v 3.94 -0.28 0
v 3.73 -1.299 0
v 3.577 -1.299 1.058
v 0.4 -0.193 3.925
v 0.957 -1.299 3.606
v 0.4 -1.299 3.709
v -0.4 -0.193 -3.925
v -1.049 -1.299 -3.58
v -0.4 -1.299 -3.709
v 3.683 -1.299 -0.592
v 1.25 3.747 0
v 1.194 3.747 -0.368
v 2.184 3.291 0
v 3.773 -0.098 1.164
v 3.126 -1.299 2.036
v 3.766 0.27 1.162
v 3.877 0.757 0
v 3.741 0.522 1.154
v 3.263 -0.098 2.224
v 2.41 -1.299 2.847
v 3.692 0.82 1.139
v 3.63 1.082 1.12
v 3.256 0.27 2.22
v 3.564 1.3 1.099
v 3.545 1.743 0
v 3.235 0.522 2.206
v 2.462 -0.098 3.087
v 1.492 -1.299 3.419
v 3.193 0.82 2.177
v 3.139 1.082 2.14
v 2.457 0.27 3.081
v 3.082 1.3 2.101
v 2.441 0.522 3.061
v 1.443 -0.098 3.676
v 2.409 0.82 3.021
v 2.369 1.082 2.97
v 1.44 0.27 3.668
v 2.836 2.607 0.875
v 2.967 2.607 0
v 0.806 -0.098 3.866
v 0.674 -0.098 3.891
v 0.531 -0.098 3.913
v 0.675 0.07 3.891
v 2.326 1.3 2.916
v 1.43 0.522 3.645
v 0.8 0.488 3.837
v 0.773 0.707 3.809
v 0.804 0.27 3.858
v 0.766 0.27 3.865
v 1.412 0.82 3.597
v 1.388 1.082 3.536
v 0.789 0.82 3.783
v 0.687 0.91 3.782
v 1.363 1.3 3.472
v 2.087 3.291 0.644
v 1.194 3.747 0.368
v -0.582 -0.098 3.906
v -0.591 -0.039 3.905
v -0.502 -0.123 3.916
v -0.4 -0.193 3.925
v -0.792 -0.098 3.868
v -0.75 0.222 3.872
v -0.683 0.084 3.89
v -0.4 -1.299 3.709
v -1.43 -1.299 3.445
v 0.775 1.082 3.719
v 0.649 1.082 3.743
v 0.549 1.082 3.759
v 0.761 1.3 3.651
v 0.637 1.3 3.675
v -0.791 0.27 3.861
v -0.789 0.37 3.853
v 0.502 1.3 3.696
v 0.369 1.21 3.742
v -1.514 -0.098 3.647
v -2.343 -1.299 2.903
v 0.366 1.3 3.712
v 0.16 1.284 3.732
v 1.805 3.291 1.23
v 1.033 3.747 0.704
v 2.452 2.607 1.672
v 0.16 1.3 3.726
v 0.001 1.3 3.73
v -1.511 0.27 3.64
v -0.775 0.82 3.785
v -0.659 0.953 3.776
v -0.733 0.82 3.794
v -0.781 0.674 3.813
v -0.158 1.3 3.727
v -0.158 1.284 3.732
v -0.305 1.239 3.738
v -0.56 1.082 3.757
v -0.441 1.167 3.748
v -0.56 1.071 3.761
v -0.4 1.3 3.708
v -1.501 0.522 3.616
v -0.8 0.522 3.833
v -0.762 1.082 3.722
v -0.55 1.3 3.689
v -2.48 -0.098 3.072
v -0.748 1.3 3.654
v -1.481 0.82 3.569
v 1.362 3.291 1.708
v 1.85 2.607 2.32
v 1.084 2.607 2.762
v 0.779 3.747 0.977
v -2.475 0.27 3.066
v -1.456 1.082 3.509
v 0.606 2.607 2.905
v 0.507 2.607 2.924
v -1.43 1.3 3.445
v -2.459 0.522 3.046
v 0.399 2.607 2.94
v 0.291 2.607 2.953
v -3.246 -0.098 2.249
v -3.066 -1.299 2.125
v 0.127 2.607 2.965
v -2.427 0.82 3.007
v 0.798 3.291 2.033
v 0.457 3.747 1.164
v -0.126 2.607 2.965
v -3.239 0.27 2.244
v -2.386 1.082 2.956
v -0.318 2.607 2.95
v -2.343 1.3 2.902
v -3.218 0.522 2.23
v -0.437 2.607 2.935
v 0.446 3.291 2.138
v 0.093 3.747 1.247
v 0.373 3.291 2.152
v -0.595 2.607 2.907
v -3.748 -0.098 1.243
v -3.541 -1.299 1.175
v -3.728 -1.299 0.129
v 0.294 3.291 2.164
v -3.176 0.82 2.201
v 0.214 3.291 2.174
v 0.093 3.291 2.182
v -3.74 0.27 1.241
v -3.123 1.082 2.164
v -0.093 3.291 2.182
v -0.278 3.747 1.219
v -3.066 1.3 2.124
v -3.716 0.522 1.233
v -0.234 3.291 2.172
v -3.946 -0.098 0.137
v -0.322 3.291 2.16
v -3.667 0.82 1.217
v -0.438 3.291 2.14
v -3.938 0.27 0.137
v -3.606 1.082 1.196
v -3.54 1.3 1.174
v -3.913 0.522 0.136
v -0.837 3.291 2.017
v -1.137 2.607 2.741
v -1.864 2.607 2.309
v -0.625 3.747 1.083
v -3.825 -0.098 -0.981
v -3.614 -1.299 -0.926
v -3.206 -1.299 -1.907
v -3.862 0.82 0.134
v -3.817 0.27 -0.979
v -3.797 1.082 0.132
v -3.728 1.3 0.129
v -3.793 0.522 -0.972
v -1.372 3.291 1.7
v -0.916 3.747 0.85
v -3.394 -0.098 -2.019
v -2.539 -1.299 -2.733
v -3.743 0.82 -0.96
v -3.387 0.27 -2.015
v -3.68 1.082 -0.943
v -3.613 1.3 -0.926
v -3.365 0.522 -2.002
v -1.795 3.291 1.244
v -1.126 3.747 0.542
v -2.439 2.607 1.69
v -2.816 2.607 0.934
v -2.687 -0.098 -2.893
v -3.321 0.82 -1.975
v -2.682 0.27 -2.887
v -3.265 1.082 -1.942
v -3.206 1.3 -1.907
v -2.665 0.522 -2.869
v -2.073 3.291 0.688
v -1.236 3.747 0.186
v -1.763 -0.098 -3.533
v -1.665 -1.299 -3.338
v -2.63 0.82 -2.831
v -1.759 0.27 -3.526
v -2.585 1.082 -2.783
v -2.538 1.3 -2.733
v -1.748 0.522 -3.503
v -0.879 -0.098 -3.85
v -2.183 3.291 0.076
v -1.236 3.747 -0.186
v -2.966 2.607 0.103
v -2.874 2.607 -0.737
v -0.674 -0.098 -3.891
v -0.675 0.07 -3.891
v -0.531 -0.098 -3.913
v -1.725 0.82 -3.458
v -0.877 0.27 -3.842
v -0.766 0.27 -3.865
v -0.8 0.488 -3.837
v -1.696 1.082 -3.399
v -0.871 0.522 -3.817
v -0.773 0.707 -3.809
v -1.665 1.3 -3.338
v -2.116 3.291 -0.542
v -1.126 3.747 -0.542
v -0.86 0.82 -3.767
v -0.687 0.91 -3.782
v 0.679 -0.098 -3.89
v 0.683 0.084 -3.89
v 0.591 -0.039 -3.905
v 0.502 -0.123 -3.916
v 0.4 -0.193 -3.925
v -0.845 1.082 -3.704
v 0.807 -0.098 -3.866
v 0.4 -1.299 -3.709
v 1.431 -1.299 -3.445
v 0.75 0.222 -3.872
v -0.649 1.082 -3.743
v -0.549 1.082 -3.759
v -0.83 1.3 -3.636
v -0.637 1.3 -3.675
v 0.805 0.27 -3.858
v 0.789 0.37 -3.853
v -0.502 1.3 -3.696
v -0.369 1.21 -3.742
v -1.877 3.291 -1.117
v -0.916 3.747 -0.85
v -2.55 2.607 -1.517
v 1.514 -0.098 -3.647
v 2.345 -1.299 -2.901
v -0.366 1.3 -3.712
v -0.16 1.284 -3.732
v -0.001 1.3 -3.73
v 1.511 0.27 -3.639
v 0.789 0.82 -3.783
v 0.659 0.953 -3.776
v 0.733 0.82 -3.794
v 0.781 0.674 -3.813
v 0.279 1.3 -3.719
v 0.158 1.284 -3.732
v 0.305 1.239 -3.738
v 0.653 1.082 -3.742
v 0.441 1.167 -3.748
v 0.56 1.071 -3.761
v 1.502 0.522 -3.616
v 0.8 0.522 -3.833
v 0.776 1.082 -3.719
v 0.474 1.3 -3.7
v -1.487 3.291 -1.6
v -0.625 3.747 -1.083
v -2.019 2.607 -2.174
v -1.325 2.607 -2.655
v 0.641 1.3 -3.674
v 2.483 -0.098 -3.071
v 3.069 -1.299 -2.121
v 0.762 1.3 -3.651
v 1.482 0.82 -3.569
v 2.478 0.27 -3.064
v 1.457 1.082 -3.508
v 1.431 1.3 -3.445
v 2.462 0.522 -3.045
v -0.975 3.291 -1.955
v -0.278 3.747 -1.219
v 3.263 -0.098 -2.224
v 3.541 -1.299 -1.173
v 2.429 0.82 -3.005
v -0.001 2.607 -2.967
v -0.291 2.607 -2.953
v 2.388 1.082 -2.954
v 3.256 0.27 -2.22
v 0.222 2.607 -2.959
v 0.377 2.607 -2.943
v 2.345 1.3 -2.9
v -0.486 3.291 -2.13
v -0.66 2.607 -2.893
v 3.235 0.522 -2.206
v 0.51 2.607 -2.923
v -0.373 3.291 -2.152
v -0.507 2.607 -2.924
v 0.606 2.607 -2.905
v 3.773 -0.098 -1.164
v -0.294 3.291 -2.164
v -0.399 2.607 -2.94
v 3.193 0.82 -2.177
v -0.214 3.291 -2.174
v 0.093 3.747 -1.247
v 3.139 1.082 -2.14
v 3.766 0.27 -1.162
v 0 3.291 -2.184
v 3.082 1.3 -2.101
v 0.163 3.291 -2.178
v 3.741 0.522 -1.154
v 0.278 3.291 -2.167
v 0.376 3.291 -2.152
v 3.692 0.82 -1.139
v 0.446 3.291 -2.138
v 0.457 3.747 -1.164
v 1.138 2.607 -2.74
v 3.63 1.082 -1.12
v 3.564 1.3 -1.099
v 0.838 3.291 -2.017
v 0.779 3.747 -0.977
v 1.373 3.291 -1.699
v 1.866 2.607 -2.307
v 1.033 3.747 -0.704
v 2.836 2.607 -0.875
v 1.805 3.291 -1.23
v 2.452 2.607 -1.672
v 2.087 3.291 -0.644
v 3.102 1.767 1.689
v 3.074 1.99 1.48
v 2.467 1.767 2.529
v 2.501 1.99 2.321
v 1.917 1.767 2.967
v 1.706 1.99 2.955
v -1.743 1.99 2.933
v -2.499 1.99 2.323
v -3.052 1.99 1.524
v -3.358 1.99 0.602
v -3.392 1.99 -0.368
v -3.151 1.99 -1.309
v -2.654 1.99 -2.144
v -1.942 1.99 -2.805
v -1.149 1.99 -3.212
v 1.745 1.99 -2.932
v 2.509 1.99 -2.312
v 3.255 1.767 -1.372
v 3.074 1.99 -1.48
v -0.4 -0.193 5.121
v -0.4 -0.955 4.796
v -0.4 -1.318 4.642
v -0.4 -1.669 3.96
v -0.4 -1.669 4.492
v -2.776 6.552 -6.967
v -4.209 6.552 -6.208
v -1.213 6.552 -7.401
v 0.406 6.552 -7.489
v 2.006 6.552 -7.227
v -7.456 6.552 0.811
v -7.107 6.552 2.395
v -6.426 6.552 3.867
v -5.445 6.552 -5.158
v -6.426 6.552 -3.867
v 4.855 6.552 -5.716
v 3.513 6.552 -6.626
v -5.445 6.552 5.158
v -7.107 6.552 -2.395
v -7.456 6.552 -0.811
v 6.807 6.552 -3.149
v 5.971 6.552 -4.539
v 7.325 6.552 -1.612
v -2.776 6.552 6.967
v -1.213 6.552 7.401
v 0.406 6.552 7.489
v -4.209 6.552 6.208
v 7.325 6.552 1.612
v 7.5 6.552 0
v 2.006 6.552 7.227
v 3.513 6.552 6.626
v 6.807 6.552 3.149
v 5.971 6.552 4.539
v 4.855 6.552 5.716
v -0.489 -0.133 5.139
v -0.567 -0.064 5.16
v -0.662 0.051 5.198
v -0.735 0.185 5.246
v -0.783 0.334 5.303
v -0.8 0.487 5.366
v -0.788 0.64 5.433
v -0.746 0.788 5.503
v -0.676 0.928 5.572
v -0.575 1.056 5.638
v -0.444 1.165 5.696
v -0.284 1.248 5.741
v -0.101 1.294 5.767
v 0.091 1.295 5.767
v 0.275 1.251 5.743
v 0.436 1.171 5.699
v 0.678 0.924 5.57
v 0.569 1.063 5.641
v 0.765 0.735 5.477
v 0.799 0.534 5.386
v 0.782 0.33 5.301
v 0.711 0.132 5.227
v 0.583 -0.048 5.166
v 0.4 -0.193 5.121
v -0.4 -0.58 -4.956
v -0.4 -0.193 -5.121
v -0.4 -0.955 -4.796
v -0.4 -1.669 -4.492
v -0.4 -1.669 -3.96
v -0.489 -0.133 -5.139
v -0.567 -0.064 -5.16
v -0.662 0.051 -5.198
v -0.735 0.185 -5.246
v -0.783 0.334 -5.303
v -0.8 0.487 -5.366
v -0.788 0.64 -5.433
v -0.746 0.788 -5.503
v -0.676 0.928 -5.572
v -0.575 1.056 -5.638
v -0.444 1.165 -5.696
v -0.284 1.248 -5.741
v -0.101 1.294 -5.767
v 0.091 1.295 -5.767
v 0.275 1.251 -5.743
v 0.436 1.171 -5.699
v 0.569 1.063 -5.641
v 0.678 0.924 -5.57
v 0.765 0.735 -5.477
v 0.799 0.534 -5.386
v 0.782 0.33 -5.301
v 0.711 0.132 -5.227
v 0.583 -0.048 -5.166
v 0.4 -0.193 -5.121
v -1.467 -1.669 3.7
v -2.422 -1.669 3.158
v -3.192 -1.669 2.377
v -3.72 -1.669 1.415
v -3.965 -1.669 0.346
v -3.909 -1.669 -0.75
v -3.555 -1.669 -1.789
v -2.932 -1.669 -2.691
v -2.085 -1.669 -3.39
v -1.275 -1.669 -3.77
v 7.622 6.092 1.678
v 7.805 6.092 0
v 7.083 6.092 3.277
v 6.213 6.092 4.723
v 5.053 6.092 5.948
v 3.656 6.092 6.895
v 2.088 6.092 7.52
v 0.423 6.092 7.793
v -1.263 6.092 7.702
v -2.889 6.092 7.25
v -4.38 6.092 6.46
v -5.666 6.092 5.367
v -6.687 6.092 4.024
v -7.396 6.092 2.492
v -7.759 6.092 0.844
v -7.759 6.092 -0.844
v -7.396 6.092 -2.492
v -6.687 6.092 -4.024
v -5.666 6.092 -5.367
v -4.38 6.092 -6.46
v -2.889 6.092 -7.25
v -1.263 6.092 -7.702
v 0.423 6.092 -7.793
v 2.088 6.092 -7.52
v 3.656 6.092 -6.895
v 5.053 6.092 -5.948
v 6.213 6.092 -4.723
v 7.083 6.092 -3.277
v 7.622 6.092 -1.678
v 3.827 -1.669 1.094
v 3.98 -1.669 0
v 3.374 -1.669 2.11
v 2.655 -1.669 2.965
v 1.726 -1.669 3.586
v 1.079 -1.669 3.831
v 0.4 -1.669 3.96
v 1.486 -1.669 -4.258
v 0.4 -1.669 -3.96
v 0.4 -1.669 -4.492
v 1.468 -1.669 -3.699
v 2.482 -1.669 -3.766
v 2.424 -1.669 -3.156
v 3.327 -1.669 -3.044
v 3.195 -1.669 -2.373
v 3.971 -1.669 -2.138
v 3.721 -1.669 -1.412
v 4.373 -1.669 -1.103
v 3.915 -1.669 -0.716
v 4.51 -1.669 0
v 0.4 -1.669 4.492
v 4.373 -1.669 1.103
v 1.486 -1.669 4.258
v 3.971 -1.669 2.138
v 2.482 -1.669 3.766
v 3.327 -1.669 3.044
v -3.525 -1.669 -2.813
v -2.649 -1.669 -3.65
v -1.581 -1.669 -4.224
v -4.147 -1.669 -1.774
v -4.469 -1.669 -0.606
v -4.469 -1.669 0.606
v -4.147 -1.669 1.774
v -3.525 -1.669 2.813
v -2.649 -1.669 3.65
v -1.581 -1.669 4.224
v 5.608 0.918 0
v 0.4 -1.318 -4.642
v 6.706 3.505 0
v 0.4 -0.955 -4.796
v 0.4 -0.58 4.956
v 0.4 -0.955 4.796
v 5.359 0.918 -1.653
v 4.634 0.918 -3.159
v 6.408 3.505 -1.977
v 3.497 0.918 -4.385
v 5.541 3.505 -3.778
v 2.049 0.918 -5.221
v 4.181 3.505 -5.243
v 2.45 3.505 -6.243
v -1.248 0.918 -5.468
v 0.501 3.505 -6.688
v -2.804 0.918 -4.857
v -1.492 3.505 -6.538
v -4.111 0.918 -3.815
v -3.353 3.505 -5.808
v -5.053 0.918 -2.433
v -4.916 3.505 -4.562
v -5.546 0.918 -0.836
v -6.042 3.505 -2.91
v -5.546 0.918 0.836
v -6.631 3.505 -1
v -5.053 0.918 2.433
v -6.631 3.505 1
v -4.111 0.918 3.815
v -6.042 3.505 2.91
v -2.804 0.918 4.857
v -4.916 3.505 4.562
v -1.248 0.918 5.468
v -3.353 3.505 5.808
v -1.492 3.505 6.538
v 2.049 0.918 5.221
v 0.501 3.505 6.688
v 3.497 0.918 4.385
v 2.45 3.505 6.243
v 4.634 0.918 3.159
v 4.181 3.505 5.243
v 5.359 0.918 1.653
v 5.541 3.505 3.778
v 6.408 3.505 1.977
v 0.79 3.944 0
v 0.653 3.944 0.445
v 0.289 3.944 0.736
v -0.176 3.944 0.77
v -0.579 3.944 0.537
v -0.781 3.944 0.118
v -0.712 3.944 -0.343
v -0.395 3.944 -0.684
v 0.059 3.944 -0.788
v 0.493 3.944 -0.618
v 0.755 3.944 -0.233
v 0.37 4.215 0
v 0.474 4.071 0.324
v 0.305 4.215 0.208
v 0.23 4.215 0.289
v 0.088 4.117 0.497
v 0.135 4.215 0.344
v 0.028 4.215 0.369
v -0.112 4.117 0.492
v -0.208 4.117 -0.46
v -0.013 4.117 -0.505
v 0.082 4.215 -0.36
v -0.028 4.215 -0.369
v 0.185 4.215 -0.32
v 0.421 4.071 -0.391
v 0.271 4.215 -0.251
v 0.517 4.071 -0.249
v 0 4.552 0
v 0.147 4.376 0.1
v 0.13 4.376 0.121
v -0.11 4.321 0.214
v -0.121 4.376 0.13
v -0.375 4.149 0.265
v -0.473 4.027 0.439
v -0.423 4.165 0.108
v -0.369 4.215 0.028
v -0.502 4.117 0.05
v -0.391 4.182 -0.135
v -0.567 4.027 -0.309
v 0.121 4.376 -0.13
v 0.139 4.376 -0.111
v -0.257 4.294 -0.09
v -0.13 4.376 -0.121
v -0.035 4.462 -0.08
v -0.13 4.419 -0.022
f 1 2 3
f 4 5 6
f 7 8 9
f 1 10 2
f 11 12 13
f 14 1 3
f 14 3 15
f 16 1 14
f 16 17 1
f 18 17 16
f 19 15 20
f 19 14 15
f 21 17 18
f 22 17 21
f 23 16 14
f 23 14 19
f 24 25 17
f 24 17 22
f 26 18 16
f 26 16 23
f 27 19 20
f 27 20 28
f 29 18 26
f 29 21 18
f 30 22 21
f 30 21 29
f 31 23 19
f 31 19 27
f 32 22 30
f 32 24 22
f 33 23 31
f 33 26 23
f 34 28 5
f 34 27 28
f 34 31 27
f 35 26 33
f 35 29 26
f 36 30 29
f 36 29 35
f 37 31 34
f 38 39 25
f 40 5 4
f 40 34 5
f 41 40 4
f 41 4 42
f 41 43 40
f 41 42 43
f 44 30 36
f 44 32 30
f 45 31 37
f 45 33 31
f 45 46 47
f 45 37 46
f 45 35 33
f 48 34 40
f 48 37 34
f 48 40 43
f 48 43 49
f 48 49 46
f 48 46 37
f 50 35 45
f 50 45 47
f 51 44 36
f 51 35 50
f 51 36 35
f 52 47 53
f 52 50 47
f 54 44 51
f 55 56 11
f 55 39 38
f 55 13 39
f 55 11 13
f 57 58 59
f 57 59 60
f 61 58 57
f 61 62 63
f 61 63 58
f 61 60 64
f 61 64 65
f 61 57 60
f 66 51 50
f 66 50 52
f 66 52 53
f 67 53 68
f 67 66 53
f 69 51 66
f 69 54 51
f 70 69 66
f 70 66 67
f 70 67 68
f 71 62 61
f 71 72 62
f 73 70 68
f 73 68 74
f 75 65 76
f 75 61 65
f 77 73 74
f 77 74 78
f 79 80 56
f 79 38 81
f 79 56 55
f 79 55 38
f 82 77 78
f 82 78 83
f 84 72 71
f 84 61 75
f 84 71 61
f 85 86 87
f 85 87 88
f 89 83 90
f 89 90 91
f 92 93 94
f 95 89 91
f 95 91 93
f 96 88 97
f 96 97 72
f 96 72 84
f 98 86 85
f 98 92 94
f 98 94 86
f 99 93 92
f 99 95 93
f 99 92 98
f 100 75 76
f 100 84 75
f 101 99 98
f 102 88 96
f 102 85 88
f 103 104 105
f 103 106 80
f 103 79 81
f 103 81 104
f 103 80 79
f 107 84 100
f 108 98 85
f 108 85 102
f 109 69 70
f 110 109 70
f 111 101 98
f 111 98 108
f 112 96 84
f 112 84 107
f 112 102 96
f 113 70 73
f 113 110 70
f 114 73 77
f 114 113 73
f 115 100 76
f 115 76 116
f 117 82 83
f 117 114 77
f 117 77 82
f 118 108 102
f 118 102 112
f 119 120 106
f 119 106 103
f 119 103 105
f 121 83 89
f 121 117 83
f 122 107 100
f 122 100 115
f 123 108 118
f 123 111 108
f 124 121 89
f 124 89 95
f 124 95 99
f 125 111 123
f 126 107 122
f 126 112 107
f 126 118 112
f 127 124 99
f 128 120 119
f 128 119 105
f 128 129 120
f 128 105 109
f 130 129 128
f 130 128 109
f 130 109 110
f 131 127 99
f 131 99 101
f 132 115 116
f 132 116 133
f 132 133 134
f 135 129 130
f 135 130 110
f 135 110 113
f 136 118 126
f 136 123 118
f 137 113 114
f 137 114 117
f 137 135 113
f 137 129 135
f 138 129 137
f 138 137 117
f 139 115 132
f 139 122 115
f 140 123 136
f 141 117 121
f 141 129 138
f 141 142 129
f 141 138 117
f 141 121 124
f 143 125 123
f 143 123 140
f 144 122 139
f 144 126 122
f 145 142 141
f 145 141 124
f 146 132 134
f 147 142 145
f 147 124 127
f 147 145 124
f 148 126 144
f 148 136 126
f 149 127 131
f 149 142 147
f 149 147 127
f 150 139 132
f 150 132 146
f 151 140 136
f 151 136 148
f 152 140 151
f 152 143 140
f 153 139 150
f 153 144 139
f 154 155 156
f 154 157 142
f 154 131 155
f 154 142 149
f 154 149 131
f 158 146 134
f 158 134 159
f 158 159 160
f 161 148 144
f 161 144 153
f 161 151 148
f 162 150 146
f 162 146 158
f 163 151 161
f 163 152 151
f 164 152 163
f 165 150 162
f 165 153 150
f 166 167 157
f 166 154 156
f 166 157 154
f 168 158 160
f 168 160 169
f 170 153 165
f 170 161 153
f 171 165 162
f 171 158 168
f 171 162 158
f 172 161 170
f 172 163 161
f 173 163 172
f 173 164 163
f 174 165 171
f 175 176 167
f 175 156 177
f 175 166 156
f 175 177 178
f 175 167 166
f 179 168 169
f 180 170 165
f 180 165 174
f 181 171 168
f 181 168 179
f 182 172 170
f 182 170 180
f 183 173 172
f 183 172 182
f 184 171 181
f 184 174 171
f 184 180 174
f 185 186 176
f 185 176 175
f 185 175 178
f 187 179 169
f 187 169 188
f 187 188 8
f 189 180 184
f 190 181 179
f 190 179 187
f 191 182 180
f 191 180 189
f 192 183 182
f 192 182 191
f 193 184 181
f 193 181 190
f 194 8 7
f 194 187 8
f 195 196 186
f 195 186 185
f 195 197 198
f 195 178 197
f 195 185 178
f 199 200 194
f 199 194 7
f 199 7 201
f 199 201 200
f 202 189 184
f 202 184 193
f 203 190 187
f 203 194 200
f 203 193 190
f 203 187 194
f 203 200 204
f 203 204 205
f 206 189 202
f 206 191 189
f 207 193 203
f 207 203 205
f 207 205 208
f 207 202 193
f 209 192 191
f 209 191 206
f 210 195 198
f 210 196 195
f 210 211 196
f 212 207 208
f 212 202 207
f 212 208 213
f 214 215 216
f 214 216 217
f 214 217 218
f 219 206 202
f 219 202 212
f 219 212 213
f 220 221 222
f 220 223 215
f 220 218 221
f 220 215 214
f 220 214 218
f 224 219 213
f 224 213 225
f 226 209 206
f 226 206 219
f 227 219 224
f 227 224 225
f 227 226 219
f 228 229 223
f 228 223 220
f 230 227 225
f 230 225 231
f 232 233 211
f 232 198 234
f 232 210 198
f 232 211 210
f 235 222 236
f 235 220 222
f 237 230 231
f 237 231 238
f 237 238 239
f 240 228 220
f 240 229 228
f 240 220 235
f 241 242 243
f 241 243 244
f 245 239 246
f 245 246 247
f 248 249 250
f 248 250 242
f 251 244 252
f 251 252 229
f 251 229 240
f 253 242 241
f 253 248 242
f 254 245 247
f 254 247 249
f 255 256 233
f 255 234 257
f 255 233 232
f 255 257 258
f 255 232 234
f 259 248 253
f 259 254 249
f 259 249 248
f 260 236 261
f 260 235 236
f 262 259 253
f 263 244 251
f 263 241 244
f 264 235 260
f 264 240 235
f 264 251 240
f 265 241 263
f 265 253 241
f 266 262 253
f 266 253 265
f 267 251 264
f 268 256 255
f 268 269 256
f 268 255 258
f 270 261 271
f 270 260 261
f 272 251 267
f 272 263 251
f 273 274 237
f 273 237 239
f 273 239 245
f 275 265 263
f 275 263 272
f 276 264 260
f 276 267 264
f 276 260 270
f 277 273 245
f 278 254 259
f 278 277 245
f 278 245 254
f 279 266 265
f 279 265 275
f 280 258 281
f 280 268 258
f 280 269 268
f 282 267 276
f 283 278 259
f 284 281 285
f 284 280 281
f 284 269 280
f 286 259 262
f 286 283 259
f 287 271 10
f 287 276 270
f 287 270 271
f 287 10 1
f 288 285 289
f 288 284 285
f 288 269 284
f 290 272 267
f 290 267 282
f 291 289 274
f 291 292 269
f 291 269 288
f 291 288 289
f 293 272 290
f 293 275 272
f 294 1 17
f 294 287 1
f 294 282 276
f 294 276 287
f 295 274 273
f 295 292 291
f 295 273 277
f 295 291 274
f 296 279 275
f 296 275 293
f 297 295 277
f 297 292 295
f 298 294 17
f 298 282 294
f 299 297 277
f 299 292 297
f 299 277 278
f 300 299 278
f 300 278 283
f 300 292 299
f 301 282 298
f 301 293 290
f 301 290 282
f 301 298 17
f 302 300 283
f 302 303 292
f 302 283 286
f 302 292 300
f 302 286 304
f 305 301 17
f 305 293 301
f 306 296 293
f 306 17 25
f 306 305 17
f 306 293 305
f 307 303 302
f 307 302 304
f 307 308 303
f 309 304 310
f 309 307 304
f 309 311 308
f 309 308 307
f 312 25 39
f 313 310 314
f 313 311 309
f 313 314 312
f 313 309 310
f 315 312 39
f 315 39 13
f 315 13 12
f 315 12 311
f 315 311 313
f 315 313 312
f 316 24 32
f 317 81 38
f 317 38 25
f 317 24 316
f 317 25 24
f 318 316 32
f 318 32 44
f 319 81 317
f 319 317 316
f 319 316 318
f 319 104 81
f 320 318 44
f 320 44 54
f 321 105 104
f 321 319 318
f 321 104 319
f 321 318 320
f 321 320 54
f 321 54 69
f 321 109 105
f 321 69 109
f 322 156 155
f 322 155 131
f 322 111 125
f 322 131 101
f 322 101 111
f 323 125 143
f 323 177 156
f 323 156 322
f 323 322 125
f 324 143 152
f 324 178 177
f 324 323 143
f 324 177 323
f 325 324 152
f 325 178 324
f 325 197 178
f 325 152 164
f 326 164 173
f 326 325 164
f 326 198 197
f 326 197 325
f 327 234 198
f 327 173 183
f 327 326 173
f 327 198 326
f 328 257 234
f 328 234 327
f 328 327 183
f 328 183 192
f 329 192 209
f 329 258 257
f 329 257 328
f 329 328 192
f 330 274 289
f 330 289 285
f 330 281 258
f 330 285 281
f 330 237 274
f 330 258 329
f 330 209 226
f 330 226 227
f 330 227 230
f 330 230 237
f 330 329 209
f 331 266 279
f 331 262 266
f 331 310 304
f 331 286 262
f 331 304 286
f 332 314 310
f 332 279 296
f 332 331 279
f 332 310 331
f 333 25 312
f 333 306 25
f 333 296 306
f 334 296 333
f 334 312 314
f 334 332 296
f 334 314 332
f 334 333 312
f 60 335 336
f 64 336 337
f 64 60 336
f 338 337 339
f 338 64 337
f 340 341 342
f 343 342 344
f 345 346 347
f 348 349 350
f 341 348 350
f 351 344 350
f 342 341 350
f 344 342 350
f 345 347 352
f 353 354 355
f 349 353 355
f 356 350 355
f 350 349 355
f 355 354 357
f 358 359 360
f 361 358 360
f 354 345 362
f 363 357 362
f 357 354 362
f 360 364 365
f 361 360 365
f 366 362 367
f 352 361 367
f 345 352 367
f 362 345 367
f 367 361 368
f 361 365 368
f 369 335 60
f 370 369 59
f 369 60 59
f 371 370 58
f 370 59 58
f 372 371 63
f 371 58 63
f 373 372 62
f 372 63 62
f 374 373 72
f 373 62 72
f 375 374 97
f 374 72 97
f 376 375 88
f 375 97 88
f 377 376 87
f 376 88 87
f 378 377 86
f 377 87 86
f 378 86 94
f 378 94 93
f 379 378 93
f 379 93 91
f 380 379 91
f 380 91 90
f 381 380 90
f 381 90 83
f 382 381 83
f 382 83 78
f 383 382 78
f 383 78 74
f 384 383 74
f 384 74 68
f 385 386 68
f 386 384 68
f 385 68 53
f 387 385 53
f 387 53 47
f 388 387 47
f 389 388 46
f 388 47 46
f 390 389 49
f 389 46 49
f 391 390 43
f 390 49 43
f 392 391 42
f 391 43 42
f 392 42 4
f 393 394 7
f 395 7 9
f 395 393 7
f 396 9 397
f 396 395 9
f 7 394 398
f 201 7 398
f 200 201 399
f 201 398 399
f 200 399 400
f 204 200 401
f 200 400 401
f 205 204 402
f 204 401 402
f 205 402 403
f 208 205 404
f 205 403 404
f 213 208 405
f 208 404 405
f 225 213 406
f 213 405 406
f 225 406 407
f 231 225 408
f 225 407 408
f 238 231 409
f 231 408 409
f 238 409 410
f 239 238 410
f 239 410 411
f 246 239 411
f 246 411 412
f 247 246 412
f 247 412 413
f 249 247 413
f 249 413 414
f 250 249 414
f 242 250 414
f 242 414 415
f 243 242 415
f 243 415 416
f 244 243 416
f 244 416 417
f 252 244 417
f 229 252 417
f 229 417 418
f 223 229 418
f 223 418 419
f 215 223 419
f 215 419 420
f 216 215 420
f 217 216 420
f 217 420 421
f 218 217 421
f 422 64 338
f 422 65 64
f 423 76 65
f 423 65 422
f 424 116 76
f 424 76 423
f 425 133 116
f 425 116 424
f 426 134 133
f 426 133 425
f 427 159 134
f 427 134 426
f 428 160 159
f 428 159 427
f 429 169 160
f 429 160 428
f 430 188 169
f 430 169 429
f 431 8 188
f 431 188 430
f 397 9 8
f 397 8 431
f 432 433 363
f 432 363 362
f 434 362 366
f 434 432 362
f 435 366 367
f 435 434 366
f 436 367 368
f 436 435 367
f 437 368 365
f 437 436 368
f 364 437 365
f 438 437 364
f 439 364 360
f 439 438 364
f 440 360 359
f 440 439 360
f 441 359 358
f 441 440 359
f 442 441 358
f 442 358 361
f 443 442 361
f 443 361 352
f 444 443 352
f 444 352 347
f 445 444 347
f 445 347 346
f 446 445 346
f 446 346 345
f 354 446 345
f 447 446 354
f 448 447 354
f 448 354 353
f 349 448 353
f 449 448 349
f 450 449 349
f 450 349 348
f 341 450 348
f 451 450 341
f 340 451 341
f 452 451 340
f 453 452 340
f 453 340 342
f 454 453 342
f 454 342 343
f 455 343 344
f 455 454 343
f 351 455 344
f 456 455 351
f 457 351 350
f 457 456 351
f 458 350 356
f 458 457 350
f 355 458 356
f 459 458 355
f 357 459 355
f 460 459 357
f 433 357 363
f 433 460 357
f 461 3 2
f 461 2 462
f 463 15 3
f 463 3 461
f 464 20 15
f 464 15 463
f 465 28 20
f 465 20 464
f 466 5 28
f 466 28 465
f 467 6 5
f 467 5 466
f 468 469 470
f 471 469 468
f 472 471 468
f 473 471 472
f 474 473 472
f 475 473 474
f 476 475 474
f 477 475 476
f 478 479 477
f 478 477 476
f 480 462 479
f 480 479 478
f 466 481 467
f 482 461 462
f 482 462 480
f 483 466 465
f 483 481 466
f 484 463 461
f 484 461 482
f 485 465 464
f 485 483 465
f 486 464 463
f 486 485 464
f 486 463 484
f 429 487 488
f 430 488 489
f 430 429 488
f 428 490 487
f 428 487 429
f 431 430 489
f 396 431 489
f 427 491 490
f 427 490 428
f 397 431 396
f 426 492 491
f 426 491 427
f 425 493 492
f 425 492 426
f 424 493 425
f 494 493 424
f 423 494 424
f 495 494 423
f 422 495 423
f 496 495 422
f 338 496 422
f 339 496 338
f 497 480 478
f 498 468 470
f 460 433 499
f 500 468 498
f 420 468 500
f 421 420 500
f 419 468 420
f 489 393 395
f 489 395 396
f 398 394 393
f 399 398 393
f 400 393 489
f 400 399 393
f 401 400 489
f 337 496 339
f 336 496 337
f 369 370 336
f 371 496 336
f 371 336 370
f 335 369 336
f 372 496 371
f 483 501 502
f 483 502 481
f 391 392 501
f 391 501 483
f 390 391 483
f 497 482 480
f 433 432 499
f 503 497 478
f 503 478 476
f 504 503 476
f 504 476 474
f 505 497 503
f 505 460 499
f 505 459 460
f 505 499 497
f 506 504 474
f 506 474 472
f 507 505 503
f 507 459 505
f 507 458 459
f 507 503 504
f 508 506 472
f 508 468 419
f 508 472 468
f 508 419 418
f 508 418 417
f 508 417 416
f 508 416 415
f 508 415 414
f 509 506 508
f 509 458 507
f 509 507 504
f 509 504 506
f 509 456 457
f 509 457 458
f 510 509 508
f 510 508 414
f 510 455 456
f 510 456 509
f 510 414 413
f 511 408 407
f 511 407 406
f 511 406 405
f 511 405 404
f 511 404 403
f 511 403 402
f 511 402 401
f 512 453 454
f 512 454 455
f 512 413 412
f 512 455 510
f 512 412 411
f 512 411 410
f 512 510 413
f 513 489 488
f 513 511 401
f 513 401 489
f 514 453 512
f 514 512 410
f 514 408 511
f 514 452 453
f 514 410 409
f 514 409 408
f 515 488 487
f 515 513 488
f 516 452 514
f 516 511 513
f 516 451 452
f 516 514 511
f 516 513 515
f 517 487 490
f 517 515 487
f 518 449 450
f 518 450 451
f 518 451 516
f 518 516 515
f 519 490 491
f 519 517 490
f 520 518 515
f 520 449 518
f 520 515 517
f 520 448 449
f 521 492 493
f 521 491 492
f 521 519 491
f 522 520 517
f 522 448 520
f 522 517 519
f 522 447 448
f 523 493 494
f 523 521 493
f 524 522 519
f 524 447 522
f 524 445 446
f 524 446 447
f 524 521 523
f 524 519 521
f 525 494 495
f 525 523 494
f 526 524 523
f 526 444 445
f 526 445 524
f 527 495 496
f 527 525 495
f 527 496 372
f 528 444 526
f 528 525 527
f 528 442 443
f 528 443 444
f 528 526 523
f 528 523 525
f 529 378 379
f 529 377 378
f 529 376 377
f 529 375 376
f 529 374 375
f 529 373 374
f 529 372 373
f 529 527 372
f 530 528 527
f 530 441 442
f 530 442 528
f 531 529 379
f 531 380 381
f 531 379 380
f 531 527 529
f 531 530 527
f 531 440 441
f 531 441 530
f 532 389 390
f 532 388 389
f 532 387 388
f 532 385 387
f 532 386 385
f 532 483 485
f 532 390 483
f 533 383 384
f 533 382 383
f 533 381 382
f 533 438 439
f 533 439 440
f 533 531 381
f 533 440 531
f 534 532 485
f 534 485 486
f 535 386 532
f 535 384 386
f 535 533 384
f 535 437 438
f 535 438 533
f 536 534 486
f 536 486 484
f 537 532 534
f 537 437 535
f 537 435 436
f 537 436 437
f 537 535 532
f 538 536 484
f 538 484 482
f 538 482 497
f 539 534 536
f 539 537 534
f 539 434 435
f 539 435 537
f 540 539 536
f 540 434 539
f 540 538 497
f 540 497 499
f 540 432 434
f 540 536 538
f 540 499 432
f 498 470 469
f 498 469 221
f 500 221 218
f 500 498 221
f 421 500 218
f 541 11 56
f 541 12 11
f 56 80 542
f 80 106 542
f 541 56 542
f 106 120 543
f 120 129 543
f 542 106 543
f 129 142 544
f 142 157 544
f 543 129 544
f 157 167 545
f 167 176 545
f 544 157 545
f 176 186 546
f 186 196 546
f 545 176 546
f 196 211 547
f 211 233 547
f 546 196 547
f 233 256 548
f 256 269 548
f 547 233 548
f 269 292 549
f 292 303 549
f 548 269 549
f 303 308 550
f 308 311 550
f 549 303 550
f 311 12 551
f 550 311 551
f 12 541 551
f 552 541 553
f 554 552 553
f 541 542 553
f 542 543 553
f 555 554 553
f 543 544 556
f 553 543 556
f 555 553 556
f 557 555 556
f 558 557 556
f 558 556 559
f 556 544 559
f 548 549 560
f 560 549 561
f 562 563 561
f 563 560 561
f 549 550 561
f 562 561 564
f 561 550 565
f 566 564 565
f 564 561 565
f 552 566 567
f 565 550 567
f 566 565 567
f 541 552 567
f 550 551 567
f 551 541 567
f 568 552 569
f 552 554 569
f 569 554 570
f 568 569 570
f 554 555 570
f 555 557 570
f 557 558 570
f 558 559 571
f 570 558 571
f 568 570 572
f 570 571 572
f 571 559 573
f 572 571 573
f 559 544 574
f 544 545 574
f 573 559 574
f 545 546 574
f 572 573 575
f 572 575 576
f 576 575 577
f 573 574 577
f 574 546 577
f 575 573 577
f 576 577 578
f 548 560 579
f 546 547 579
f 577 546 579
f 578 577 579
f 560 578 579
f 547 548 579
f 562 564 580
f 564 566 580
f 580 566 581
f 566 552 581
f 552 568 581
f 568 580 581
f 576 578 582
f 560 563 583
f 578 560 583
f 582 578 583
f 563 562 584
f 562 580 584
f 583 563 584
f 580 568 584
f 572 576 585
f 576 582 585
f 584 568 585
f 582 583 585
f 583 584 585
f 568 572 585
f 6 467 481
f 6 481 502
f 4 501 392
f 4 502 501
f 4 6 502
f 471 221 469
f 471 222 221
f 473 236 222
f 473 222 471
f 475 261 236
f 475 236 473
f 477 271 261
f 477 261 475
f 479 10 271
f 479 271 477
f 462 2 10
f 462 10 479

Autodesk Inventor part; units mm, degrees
ref_plane "YZ Plane" through (0, 0, 0) normal (1, 0, 0) x (0, 1, 0)
ref_plane "XZ Plane" through (0, 0, 0) normal (0, 1, 0) x (-1, 0, 0)
ref_plane "XY Plane" through (0, 0, 0) normal (0, 0, 1) x (1, 0, 0)
sketch "Sketch2" plane through (0, 0, 0) normal (0, 0, 1) x (1, 0, 0)
  arc A0 (3.5799, -1.6693) -> (1.25, 3.747) centre (0, 0) ccw
  line L0 (3.5799, -1.6693) -> (4.51, -1.6693)
  line L1 (4.51, -1.6693) -> (7.8046, 6.0923)
  line L2 (7.5, 6.5525) -> (0, 6.5525)
  line L3 (0, 6.5525) -> (0, 4.5525)
  arc A1 (0, 4.5525) -> (1.25, 3.747) centre (2.1994, 6.5928) ccw
  line L4 (0, 0) -> (1.25, 0) construction
  line L5 (7.8046, 6.0923) -> (7.5, 6.5525)
  point P0 (8, 6.5525)
  dimension "d11" = 3.95
  dimension "d12" = 2
  dimension "d13" = 67
  dimension "d14" = 3
  dimension "d15" = 2.5
  dimension "d16" = 25
  dimension "d17" = 0.5
  dimension "d18" = 0.5
  dimension "d19" = 16
  dimension "d20" = 0.9301
revolve "Revolution1" add sketch "Sketch2" angle 360 about axis through (0, 6.5525, 0) along (0, -1, 0)
chamfer "Chamfer1" distance 0.4 angle 45 1 edges at (-3.5799, -1.6693, 0)
sketch "Sketch3" plane through (0, 0, 0) normal (0, 0, 1) x (1, 0, 0)
  arc A0 (3.7304, -1.2987) -> (-3.7304, -1.2987) centre (0, 0) ccw projected
  line L0 (-3.9799, -1.6693) -> (3.9799, -1.6693) projected
  line L1 (-0.4, -1.6693) -> (0.4, -1.6693)
  line L2 (0.4, -1.6693) -> (0.4, -0.1928)
  line L3 (0.4, -0.1928) -> (-0.4, -0.1928) construction
  line L4 (-0.4, -0.1928) -> (-0.4, -1.6693)
  line L5 (-0.4, -1.6693) -> (0.4, -0.1928) construction
  line L6 (0.4, -1.6693) -> (-0.4, -0.1928) construction
  arc A1 (0.4, -0.1928) -> (-0.4, -0.1928) centre (0, 0.5) ccw
  point P0 (0, -0.9311)
  dimension "d25" = 0.8
  dimension "d26" = 0.8
  dimension "d27" = 0.5
extrude "Extrusion2" cut sketch "Sketch3" along normal through all both and the other way through all
equation "\"d18\" = d17"
properties part number "Table Clamp Swiveling Pad" material "SAE 1020"
